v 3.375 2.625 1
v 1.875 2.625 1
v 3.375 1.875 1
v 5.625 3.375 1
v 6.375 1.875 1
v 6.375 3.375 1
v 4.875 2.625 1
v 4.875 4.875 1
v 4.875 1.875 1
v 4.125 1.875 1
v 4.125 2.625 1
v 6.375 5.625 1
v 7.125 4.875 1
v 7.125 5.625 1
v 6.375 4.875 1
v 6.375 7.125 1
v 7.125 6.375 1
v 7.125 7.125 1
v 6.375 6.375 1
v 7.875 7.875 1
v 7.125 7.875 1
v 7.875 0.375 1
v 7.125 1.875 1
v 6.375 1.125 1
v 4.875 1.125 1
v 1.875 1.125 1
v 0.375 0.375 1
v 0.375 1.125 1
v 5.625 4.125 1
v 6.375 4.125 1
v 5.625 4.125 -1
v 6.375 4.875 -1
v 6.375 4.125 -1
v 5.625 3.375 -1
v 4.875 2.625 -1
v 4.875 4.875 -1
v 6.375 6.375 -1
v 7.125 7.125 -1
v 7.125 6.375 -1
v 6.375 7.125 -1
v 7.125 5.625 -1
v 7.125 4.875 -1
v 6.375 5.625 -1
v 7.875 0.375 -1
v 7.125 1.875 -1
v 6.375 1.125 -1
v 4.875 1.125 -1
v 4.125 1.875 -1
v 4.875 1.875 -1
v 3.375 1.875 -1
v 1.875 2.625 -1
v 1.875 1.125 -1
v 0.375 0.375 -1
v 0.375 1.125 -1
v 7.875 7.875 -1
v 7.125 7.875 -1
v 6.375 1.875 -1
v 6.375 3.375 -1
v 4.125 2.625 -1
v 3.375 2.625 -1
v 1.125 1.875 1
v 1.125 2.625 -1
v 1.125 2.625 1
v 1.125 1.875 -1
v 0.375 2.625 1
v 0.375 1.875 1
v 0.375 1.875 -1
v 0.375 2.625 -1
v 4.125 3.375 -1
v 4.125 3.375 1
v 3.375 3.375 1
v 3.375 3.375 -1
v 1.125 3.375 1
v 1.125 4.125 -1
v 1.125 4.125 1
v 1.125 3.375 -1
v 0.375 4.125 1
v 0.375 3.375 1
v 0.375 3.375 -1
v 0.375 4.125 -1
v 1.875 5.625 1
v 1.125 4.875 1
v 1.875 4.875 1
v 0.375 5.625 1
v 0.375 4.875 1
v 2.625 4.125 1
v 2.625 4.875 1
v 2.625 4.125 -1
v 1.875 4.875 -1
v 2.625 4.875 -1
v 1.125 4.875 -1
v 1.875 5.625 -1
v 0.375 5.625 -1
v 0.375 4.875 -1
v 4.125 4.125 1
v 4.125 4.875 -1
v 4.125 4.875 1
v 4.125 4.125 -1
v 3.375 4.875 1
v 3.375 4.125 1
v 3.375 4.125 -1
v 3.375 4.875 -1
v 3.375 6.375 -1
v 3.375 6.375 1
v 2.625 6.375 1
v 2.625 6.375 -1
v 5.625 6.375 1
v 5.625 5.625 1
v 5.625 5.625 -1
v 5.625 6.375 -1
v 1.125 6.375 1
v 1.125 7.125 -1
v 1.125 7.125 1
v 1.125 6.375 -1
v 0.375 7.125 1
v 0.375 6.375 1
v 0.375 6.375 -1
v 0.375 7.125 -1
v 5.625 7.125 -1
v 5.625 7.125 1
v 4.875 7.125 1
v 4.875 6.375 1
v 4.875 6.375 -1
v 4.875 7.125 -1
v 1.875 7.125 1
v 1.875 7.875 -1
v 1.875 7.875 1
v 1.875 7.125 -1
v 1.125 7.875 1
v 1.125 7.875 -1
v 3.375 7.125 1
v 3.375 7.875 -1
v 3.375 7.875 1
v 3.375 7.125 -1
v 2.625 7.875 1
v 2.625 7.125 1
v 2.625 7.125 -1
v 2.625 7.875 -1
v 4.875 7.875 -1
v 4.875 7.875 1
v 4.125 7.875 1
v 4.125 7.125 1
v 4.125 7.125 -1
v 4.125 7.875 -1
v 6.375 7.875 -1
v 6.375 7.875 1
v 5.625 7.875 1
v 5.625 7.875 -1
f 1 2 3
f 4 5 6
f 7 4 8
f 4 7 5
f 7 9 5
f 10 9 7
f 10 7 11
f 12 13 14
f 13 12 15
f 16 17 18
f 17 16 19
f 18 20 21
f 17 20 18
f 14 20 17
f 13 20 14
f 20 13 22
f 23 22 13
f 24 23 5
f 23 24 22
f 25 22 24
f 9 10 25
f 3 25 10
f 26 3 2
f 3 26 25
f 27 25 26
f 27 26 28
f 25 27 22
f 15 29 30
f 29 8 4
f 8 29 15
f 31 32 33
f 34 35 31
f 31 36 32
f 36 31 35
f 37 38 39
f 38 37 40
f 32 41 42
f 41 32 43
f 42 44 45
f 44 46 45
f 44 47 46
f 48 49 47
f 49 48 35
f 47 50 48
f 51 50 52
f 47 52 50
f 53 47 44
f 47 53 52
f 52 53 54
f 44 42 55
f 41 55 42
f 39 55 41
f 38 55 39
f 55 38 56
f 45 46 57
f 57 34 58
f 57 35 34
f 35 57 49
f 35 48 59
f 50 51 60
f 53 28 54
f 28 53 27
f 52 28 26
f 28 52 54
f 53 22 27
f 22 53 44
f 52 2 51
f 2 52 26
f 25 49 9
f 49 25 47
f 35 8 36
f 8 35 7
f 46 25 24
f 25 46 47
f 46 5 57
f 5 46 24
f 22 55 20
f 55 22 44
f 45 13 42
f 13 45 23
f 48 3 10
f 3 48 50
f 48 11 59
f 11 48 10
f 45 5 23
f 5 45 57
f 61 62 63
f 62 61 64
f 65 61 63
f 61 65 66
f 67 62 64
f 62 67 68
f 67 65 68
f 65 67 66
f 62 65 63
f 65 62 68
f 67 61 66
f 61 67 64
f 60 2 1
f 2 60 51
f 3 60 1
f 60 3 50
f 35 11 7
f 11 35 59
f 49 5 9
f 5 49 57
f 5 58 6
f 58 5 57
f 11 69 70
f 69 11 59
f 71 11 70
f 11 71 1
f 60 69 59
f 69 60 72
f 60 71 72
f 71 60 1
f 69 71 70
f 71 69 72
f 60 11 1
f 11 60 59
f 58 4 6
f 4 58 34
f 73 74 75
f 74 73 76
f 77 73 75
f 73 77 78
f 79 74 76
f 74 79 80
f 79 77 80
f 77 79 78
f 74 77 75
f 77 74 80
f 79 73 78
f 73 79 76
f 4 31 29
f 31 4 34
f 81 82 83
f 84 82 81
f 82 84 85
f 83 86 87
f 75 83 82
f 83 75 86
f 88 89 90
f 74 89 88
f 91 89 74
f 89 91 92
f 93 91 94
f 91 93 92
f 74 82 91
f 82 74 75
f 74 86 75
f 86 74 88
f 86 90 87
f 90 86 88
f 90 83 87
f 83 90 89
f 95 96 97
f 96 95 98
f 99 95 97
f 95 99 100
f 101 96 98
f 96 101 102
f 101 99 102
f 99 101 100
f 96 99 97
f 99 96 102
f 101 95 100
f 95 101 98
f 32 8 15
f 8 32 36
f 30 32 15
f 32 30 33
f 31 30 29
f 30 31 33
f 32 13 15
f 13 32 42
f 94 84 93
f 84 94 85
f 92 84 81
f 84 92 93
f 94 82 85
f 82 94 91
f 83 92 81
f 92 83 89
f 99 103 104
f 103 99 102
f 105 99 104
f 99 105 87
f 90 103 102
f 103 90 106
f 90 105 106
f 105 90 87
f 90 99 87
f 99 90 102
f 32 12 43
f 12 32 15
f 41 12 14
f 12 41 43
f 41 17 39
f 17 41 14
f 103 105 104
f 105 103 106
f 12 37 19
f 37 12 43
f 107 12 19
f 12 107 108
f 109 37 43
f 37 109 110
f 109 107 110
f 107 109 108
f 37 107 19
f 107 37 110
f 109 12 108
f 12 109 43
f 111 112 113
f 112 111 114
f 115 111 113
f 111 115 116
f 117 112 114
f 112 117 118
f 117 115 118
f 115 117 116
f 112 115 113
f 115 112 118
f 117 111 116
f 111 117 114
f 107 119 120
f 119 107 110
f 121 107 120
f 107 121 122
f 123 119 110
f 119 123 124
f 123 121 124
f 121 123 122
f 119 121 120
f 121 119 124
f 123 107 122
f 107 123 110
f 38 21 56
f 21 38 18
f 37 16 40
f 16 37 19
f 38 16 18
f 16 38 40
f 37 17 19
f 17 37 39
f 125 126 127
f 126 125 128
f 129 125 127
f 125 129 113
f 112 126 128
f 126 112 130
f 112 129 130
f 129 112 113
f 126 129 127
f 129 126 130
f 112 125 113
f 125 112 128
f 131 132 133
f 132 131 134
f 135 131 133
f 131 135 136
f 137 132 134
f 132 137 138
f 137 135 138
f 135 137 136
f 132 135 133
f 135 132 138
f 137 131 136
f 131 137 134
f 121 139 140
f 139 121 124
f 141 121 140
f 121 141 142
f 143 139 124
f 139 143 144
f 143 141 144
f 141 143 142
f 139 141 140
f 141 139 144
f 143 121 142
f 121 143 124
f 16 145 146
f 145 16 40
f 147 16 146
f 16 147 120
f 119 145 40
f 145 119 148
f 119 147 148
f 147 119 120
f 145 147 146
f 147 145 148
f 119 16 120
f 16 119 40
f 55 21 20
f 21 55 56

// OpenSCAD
rotate([0,0,0])translate([0,0,0,]){
translate([0.75,0.75,0])  cube(size = [0.75,0.75,2], center=true);
translate([1.5,0.75,0])  cube(size = [0.75,0.75,2], center=true);
translate([2.25,0.75,0])  cube(size = [0.75,0.75,2], center=true);
translate([3,0.75,0])  cube(size = [0.75,0.75,2], center=true);
translate([3.75,0.75,0])  cube(size = [0.75,0.75,2], center=true);
translate([4.5,0.75,0])  cube(size = [0.75,0.75,2], center=true);
translate([5.25,0.75,0])  cube(size = [0.75,0.75,2], center=true);
translate([6,0.75,0])  cube(size = [0.75,0.75,2], center=true);
translate([6.75,0.75,0])  cube(size = [0.75,0.75,2], center=true);
translate([7.5,0.75,0])  cube(size = [0.75,0.75,2], center=true);
translate([7.5,0.75,0])  cube(size = [0.75,0.75,2], center=true);
translate([7.5,0.75,0])  cube(size = [0.75,0.75,2], center=true);
translate([2.25,1.5,0])  cube(size = [0.75,0.75,2], center=true);
translate([3,1.5,0])  cube(size = [0.75,0.75,2], center=true);
translate([3.75,1.5,0])  cube(size = [0.75,0.75,2], center=true);
translate([4.5,1.5,0])  cube(size = [0.75,0.75,2], center=true);
translate([4.5,1.5,0])  cube(size = [0.75,0.75,2], center=true);
translate([4.5,1.5,0])  cube(size = [0.75,0.75,2], center=true);
translate([6.75,1.5,0])  cube(size = [0.75,0.75,2], center=true);
translate([7.5,1.5,0])  cube(size = [0.75,0.75,2], center=true);
translate([0.75,2.25,0])  cube(size = [0.75,0.75,2], center=true);
translate([0.75,2.25,0])  cube(size = [0.75,0.75,2], center=true);
translate([2.25,2.25,0])  cube(size = [0.75,0.75,2], center=true);
translate([3,2.25,0])  cube(size = [0.75,0.75,2], center=true);
translate([3,2.25,0])  cube(size = [0.75,0.75,2], center=true);
translate([4.5,2.25,0])  cube(size = [0.75,0.75,2], center=true);
translate([5.25,2.25,0])  cube(size = [0.75,0.75,2], center=true);
translate([6,2.25,0])  cube(size = [0.75,0.75,2], center=true);
translate([6,2.25,0])  cube(size = [0.75,0.75,2], center=true);
translate([7.5,2.25,0])  cube(size = [0.75,0.75,2], center=true);
translate([7.5,2.25,0])  cube(size = [0.75,0.75,2], center=true);
translate([7.5,2.25,0])  cube(size = [0.75,0.75,2], center=true);
translate([7.5,2.25,0])  cube(size = [0.75,0.75,2], center=true);
translate([7.5,2.25,0])  cube(size = [0.75,0.75,2], center=true);
translate([3.75,3,0])  cube(size = [0.75,0.75,2], center=true);
translate([3.75,3,0])  cube(size = [0.75,0.75,2], center=true);
translate([5.25,3,0])  cube(size = [0.75,0.75,2], center=true);
translate([6,3,0])  cube(size = [0.75,0.75,2], center=true);
translate([6,3,0])  cube(size = [0.75,0.75,2], center=true);
translate([7.5,3,0])  cube(size = [0.75,0.75,2], center=true);
translate([0.75,3.75,0])  cube(size = [0.75,0.75,2], center=true);
translate([0.75,3.75,0])  cube(size = [0.75,0.75,2], center=true);
translate([0.75,3.75,0])  cube(size = [0.75,0.75,2], center=true);
translate([0.75,3.75,0])  cube(size = [0.75,0.75,2], center=true);
translate([0.75,3.75,0])  cube(size = [0.75,0.75,2], center=true);
translate([0.75,3.75,0])  cube(size = [0.75,0.75,2], center=true);
translate([5.25,3.75,0])  cube(size = [0.75,0.75,2], center=true);
translate([5.25,3.75,0])  cube(size = [0.75,0.75,2], center=true);
translate([5.25,3.75,0])  cube(size = [0.75,0.75,2], center=true);
translate([7.5,3.75,0])  cube(size = [0.75,0.75,2], center=true);
translate([7.5,3.75,0])  cube(size = [0.75,0.75,2], center=true);
translate([1.5,4.5,0])  cube(size = [0.75,0.75,2], center=true);
translate([2.25,4.5,0])  cube(size = [0.75,0.75,2], center=true);
translate([2.25,4.5,0])  cube(size = [0.75,0.75,2], center=true);
translate([3.75,4.5,0])  cube(size = [0.75,0.75,2], center=true);
translate([3.75,4.5,0])  cube(size = [0.75,0.75,2], center=true);
translate([5.25,4.5,0])  cube(size = [0.75,0.75,2], center=true);
translate([6,4.5,0])  cube(size = [0.75,0.75,2], center=true);
translate([6,4.5,0])  cube(size = [0.75,0.75,2], center=true);
translate([7.5,4.5,0])  cube(size = [0.75,0.75,2], center=true);
translate([0.75,5.25,0])  cube(size = [0.75,0.75,2], center=true);
translate([1.5,5.25,0])  cube(size = [0.75,0.75,2], center=true);
translate([1.5,5.25,0])  cube(size = [0.75,0.75,2], center=true);
translate([3,5.25,0])  cube(size = [0.75,0.75,2], center=true);
translate([3,5.25,0])  cube(size = [0.75,0.75,2], center=true);
translate([3,5.25,0])  cube(size = [0.75,0.75,2], center=true);
translate([3,5.25,0])  cube(size = [0.75,0.75,2], center=true);
translate([3,5.25,0])  cube(size = [0.75,0.75,2], center=true);
translate([6.75,5.25,0])  cube(size = [0.75,0.75,2], center=true);
translate([7.5,5.25,0])  cube(size = [0.75,0.75,2], center=true);
translate([7.5,5.25,0])  cube(size = [0.75,0.75,2], center=true);
translate([7.5,5.25,0])  cube(size = [0.75,0.75,2], center=true);
translate([7.5,5.25,0])  cube(size = [0.75,0.75,2], center=true);
translate([3,6,0])  cube(size = [0.75,0.75,2], center=true);
translate([3,6,0])  cube(size = [0.75,0.75,2], center=true);
translate([3,6,0])  cube(size = [0.75,0.75,2], center=true);
translate([3,6,0])  cube(size = [0.75,0.75,2], center=true);
translate([6,6,0])  cube(size = [0.75,0.75,2], center=true);
translate([6,6,0])  cube(size = [0.75,0.75,2], center=true);
translate([7.5,6,0])  cube(size = [0.75,0.75,2], center=true);
translate([0.75,6.75,0])  cube(size = [0.75,0.75,2], center=true);
translate([0.75,6.75,0])  cube(size = [0.75,0.75,2], center=true);
translate([0.75,6.75,0])  cube(size = [0.75,0.75,2], center=true);
translate([0.75,6.75,0])  cube(size = [0.75,0.75,2], center=true);
translate([0.75,6.75,0])  cube(size = [0.75,0.75,2], center=true);
translate([0.75,6.75,0])  cube(size = [0.75,0.75,2], center=true);
translate([5.25,6.75,0])  cube(size = [0.75,0.75,2], center=true);
translate([5.25,6.75,0])  cube(size = [0.75,0.75,2], center=true);
translate([6.75,6.75,0])  cube(size = [0.75,0.75,2], center=true);
translate([7.5,6.75,0])  cube(size = [0.75,0.75,2], center=true);
translate([7.5,6.75,0])  cube(size = [0.75,0.75,2], center=true);
translate([1.5,7.5,0])  cube(size = [0.75,0.75,2], center=true);
translate([1.5,7.5,0])  cube(size = [0.75,0.75,2], center=true);
translate([3,7.5,0])  cube(size = [0.75,0.75,2], center=true);
translate([3,7.5,0])  cube(size = [0.75,0.75,2], center=true);
translate([4.5,7.5,0])  cube(size = [0.75,0.75,2], center=true);
translate([4.5,7.5,0])  cube(size = [0.75,0.75,2], center=true);
translate([6,7.5,0])  cube(size = [0.75,0.75,2], center=true);
translate([6,7.5,0])  cube(size = [0.75,0.75,2], center=true);
translate([7.5,7.5,0])  cube(size = [0.75,0.75,2], center=true);
}
